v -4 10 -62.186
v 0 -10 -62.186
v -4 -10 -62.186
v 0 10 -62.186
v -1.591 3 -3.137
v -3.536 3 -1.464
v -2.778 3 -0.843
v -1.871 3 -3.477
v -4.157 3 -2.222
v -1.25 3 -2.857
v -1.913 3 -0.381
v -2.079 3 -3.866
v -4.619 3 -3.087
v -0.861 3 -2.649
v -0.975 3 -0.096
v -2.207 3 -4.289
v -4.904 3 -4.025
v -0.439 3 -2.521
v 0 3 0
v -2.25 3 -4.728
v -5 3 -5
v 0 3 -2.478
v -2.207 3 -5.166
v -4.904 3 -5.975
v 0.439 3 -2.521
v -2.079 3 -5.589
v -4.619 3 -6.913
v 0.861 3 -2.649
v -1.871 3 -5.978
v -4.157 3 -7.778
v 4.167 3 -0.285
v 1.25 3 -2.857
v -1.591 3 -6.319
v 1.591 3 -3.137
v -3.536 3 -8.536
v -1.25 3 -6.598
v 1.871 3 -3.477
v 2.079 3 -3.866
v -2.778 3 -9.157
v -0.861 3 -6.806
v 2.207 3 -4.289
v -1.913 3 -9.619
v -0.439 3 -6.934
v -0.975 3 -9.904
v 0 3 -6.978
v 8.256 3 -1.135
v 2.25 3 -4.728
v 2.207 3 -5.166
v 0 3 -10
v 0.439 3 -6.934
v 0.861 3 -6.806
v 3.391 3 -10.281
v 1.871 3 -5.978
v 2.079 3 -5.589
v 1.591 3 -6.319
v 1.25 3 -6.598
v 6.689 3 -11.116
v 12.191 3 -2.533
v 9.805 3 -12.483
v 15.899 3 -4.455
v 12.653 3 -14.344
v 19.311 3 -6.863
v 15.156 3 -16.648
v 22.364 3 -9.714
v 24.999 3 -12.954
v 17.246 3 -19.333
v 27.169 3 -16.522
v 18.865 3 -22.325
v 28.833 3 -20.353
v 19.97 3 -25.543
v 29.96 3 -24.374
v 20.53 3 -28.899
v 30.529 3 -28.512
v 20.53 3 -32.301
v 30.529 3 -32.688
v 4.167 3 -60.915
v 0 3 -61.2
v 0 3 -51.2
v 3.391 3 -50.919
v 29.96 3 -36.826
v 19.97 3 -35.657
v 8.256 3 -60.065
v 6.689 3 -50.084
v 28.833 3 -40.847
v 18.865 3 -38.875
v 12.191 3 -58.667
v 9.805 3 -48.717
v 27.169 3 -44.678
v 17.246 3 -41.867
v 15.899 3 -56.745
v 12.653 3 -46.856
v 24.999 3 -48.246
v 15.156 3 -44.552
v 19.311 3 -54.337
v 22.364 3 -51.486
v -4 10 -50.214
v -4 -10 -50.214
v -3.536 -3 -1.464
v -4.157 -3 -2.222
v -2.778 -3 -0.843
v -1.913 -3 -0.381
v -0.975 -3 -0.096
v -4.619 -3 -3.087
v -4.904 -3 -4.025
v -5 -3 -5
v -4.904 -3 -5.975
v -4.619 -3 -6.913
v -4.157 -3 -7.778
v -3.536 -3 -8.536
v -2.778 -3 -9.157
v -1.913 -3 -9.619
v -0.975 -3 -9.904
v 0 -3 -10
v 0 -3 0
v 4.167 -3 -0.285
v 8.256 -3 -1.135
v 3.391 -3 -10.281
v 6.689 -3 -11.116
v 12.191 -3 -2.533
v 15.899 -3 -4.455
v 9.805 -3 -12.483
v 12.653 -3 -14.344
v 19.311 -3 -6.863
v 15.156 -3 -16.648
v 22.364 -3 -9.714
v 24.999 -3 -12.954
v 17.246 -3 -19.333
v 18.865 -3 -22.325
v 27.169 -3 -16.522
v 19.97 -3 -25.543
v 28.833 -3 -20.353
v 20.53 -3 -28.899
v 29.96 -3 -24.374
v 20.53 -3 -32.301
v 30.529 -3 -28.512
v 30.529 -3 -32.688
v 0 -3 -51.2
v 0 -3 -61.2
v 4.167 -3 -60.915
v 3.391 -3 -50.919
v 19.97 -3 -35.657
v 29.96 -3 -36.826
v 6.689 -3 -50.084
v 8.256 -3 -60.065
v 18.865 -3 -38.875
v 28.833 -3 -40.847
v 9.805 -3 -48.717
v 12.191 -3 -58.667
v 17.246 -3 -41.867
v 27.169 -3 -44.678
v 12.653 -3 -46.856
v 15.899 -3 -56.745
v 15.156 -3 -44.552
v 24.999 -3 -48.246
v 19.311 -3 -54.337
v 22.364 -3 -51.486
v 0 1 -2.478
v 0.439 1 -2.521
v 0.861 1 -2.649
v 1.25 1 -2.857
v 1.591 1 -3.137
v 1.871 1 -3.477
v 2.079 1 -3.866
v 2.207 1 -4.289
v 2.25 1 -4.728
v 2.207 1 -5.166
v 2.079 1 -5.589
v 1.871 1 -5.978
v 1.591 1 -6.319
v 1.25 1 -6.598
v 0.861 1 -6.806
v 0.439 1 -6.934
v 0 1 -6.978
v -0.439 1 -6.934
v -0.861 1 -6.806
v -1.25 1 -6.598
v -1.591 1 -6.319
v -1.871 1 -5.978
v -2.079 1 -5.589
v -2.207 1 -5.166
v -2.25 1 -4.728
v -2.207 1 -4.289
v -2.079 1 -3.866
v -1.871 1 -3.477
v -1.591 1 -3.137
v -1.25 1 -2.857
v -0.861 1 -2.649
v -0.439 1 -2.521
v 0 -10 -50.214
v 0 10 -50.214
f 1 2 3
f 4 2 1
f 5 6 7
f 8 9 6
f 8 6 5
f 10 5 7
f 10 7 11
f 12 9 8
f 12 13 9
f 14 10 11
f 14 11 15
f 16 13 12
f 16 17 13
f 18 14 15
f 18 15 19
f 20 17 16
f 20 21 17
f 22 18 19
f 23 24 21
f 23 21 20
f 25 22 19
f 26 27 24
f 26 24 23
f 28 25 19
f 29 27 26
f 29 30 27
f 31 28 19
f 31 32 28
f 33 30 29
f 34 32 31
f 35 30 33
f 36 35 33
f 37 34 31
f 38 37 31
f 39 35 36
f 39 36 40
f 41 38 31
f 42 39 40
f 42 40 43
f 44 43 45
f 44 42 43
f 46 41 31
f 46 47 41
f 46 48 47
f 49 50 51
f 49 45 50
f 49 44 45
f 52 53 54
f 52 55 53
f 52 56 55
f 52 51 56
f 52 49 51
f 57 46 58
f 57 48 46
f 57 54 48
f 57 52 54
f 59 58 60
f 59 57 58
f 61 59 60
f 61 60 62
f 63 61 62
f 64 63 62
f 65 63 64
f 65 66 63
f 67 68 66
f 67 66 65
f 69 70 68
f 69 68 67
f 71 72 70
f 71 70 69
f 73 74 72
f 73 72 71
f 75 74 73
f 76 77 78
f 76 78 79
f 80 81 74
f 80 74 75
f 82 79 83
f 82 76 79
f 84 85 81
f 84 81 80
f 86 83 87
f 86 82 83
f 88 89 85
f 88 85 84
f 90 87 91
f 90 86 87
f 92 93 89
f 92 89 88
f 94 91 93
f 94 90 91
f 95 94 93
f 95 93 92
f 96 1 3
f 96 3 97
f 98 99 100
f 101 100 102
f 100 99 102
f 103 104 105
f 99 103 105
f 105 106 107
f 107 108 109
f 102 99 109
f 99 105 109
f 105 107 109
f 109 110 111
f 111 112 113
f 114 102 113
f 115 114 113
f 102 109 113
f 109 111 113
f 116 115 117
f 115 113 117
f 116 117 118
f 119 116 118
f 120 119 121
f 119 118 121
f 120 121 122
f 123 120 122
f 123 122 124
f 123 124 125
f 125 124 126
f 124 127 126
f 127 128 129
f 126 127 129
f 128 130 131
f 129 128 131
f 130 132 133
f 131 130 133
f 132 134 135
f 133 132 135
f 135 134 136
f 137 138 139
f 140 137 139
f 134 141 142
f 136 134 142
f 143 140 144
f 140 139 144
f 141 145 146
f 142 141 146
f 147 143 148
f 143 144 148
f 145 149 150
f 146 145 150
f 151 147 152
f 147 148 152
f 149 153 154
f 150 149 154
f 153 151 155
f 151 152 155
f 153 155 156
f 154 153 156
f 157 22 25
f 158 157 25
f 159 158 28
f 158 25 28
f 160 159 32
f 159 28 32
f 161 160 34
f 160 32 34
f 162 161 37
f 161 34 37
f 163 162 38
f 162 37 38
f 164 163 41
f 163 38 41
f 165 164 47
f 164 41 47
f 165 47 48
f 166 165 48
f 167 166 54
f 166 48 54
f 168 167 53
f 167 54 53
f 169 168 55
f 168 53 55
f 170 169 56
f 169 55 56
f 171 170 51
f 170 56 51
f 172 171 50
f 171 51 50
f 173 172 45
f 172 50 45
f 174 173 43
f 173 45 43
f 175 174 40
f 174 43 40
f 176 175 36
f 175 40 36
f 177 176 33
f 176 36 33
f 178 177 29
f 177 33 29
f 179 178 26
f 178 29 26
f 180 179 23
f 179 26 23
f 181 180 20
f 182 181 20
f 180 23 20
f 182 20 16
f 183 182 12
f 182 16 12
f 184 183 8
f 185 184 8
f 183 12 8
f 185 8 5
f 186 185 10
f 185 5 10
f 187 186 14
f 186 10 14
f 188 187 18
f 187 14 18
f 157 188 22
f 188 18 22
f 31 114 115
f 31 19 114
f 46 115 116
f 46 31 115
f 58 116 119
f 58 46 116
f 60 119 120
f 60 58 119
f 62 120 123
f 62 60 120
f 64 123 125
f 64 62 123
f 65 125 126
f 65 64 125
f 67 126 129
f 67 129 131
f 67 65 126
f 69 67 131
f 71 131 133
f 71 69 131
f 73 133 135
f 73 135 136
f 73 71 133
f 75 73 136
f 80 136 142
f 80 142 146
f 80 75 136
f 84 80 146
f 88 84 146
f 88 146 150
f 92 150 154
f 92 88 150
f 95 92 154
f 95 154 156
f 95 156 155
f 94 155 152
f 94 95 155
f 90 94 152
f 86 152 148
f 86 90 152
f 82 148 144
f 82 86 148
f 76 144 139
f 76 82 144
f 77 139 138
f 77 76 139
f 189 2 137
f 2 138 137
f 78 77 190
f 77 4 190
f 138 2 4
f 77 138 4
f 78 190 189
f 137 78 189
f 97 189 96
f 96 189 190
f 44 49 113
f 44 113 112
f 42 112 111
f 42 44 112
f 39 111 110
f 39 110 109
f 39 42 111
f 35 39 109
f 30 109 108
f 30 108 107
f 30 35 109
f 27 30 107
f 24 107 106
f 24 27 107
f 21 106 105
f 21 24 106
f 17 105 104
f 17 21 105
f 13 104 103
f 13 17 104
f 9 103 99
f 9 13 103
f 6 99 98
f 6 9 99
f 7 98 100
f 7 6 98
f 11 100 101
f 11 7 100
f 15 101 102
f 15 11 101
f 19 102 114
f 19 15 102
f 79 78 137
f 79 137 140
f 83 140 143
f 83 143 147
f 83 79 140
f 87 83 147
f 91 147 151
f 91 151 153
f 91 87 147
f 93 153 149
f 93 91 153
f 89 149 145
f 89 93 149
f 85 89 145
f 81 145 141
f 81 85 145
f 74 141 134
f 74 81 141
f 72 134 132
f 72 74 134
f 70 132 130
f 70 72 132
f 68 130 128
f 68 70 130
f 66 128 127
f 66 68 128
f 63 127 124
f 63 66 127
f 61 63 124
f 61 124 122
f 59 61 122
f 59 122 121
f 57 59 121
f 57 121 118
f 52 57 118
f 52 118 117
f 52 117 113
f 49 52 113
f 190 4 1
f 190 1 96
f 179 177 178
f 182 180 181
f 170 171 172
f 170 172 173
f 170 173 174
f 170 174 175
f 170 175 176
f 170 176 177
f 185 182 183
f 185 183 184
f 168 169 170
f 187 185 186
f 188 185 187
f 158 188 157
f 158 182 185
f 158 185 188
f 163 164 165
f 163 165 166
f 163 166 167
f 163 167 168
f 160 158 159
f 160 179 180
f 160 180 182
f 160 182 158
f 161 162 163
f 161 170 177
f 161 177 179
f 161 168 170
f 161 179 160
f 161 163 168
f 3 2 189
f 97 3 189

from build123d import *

# Parameters (mm, degrees)
BOSS_EXTRUDE1_DEPTH = 3
SKETCH2_R           = 2.25
CUT_EXTRUDE1_DEPTH  = 2
SKETCH4_W           = 11.97211786
SKETCH4_H           = 20
BOSS_EXTRUDE3_DEPTH = 4


with BuildPart() as part:
    # Sketch1 → Boss-Extrude1 (new, symmetric)
    with BuildSketch(Plane(origin=(0, 0, 0), x_dir=(1, 0, 0), z_dir=(0, 1, 0))):
        with BuildLine():
            Line((0, 61.2), (0, 51.2))
            ThreePointArc((0, 51.2), (20.599999205, 30.599999922), (-1.55e-07, 10))
            ThreePointArc((-1.55e-07, 10), (-5, 4.999999922), (0, 0))
            ThreePointArc((0, 0), (30.6, 30.6), (0, 61.2))
        make_face()
    extrude(amount=BOSS_EXTRUDE1_DEPTH, both=True)

    # Sketch2 → Cut-Extrude1 (cut)
    with BuildSketch(Plane(origin=(0, 3, 0), x_dir=(1, 0, 0), z_dir=(0, 1, 0))):
        with Locations(Location((0, 4.727516706, 0), (0, 0, 270))):
            Circle(SKETCH2_R)
    extrude(amount=-CUT_EXTRUDE1_DEPTH, mode=Mode.SUBTRACT)

    # Sketch4 → Boss-Extrude3 (add)
    with BuildSketch(Plane.ZY):
        with Locations((-56.2, 0)):
            Rectangle(SKETCH4_W, SKETCH4_H)
    extrude(amount=BOSS_EXTRUDE3_DEPTH)


solid = part.part
